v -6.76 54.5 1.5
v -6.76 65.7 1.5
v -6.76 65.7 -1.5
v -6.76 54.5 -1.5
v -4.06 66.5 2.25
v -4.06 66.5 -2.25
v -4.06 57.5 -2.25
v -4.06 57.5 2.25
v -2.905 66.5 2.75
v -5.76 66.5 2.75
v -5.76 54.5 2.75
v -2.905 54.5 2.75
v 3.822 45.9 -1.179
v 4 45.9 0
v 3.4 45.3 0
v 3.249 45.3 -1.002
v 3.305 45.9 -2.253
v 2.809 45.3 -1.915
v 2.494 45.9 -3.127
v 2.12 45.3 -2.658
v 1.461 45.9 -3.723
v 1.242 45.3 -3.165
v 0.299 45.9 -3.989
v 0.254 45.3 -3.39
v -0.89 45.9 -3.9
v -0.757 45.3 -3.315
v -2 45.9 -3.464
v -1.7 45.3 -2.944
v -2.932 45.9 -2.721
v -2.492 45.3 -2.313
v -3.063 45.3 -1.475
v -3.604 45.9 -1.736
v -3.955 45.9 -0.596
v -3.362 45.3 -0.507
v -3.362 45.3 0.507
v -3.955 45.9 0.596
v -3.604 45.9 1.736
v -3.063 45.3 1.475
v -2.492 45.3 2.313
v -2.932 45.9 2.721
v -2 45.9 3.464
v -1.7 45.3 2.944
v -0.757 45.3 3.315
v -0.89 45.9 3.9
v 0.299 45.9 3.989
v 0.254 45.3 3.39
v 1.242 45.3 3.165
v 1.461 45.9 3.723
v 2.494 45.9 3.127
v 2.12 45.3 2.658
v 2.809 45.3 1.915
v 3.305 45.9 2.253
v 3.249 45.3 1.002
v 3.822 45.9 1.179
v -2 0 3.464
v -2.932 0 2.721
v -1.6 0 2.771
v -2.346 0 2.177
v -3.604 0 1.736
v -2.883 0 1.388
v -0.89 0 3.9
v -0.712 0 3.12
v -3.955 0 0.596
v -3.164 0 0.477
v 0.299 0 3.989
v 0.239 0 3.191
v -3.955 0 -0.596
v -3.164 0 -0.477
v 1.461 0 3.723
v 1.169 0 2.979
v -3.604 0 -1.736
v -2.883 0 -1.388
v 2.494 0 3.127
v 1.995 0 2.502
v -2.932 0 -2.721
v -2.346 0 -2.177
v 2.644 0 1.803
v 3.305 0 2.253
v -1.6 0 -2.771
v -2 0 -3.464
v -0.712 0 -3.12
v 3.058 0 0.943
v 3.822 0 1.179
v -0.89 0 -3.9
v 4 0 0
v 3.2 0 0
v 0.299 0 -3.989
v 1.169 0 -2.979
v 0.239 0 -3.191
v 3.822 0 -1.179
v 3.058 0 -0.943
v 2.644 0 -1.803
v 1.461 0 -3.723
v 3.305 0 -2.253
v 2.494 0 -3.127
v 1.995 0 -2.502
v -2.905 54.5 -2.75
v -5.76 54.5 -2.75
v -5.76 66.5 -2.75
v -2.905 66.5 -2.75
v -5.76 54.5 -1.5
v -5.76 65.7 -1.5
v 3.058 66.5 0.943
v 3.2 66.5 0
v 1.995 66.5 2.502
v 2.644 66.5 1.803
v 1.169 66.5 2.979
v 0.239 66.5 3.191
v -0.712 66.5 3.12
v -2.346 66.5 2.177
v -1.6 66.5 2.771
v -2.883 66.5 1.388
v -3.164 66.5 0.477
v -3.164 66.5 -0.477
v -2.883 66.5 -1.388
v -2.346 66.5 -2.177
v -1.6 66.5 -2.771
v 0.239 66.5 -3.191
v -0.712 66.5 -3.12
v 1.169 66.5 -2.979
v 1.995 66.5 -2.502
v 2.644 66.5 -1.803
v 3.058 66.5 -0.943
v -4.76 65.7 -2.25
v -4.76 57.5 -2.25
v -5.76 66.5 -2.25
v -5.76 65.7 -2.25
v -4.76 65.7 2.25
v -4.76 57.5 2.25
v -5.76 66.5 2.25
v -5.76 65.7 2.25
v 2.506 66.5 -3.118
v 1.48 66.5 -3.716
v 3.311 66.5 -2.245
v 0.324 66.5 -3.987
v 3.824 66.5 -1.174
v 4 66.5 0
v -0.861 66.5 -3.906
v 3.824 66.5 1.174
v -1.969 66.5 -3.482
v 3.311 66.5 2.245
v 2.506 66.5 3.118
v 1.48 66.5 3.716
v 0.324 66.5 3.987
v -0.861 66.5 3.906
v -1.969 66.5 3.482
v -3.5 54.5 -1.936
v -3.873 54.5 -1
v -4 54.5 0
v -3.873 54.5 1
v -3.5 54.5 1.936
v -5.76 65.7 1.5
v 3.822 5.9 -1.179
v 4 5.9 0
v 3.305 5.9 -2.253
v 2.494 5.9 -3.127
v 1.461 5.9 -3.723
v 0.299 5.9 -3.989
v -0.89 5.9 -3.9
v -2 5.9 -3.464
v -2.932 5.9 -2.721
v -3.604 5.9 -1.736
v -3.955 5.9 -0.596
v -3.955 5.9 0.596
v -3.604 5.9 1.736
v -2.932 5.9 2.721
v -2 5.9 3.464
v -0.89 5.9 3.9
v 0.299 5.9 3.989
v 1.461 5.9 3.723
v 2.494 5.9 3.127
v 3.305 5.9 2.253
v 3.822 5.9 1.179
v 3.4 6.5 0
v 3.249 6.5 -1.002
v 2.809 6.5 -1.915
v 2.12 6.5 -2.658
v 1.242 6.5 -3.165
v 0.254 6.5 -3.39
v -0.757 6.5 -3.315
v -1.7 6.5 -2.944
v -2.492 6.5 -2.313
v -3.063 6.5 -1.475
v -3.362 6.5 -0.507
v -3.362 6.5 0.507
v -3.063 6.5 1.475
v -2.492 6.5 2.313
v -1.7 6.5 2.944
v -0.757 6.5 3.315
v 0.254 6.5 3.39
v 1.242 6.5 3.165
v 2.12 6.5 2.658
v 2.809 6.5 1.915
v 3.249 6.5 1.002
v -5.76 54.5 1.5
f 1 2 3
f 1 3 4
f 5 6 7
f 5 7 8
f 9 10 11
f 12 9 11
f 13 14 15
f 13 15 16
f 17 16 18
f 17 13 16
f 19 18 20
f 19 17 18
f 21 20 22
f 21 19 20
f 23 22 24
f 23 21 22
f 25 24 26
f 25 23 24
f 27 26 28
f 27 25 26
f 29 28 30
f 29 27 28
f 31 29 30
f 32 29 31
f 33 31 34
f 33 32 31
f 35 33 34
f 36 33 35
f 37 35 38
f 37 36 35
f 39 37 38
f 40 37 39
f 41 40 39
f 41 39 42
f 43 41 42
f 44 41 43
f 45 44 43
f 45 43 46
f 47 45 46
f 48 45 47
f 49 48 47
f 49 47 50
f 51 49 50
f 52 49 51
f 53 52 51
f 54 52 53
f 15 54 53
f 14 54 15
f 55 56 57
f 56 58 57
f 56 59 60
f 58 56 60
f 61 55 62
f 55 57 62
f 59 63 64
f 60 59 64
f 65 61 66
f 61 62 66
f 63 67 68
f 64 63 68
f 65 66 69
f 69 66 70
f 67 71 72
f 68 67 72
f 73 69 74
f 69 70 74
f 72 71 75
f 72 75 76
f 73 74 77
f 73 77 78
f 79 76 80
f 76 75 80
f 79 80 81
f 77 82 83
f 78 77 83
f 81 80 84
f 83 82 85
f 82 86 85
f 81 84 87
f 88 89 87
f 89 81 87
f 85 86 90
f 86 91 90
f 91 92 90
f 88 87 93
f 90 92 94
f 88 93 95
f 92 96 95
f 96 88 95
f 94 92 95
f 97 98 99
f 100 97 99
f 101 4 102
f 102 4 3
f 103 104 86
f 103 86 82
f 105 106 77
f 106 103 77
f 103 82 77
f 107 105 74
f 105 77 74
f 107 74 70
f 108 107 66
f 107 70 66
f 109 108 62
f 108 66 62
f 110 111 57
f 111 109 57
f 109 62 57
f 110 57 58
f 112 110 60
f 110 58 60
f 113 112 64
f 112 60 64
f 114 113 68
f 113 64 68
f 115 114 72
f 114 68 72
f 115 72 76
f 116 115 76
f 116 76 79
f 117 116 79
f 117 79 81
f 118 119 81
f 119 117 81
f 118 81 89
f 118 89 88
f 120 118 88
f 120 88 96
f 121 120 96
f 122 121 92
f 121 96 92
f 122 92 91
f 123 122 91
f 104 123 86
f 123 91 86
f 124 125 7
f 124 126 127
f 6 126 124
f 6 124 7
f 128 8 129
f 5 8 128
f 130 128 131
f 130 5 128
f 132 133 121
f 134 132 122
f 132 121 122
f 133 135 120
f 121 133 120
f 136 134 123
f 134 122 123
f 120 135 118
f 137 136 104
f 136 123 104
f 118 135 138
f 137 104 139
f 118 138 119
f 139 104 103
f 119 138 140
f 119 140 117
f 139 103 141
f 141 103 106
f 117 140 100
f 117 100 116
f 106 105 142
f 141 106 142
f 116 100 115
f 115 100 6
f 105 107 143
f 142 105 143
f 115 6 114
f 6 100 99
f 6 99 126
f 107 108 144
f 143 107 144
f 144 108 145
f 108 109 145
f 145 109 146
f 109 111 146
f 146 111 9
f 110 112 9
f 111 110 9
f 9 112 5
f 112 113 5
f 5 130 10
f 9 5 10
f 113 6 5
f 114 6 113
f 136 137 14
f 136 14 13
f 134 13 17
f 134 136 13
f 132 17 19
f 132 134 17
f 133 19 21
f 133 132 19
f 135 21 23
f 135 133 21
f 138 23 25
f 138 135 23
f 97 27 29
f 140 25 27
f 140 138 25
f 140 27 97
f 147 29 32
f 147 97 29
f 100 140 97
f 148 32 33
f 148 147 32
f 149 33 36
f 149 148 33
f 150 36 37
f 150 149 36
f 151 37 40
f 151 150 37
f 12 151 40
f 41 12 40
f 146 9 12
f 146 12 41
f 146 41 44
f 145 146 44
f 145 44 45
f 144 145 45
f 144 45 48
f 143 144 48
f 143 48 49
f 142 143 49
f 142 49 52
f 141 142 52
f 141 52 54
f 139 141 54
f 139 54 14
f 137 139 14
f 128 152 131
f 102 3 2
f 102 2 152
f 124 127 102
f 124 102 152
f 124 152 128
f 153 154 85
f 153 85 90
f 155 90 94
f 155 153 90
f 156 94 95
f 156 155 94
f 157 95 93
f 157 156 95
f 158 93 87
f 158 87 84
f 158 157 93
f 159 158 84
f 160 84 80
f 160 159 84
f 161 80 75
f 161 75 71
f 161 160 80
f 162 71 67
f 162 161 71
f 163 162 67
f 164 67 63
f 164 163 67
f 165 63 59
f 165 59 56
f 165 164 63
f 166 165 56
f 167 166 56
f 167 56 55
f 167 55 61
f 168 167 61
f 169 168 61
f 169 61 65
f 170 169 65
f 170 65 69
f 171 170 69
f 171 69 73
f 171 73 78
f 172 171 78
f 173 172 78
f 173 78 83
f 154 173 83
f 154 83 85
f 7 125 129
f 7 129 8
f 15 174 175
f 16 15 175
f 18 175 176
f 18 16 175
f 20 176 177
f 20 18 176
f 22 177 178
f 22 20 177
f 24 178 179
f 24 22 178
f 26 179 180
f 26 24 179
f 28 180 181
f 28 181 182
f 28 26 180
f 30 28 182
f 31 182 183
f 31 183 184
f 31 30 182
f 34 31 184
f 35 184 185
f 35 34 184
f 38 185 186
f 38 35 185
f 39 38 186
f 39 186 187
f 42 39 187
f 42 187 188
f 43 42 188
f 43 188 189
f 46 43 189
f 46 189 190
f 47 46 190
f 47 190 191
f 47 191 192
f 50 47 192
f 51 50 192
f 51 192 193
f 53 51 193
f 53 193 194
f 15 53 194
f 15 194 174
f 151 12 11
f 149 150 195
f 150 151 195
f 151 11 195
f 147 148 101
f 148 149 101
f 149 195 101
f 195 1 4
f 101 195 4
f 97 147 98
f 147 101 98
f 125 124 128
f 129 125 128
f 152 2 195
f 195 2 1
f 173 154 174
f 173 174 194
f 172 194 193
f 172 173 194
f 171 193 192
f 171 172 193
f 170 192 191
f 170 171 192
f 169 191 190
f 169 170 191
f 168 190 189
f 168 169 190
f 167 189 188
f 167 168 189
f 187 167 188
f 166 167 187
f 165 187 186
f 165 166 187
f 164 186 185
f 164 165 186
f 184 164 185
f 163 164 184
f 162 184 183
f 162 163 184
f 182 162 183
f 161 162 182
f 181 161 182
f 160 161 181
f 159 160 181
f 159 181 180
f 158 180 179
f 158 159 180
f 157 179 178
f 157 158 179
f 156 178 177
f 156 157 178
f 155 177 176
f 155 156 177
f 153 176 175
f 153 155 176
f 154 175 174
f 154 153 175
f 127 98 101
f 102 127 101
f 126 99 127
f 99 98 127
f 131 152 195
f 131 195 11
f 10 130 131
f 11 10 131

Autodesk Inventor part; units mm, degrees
ref_plane "XZ Plane" through (0, 0, 0) normal (0, 1, 0) x (-1, 0, 0)
ref_plane "XY Plane" through (0, 0, 0) normal (0, 0, 1) x (1, 0, 0)
sketch "Sketch1" plane through (0, 0, 0) normal (0, 0, 1) x (1, 0, 0)
  line L0 (0, 0) -> (0, 66.5)
  line L1 (3.2, 0) -> (4, 0)
  line L2 (4, 0) -> (4, 5.9)
  line L3 (4, 5.9) -> (3.4, 6.5)
  line L4 (3.4, 6.5) -> (3.4, 45.3)
  line L5 (3.4, 45.3) -> (4, 45.9)
  line L6 (4, 45.9) -> (4, 66.5)
  line L7 (4, 66.5) -> (3.2, 66.5)
  line L8 (3.2, 66.5) -> (3.2, 0)
  dimension "d0" = 45
  dimension "d1" = 45
  dimension "d2" = 6.4
  dimension "d3" = 8
  dimension "d4" = 6.5
  dimension "d5" = 45.3
  dimension "d6" = 66.5
  dimension "d7" = 6.8
revolve "Revolution1" add sketch "Sketch1" angle 360 about axis through (0, 0, 0) along (0, 1, 0)
ref_plane "Work Plane1" through (-6.76, 0, 0) normal (-1, 0, 0) x (0, -1, 0)
sketch "Sketch2" plane through (-6.76, 0, 0) normal (-1, 0, 0) x (0, -1, 0)
  line L0 (-65.7, 1.5) -> (-54.5, 1.5)
  line L1 (-54.5, 1.5) -> (-54.5, -1.5)
  line L2 (-54.5, -1.5) -> (-65.7, -1.5)
  line L3 (-65.7, -1.5) -> (-65.7, 1.5)
  line L4 (-65.7, 2.75) -> (-54.5, 2.75)
  line L5 (-54.5, 2.75) -> (-54.5, -2.75)
  line L6 (-54.5, -2.75) -> (-65.7, -2.75)
  line L7 (-65.7, -2.75) -> (-65.7, 2.75)
  line L8 (13.7787, 0) -> (-82.6723, 0) projected
  line L9 (0, -4) -> (0, 4) projected
  dimension "d10" = 54.5
  dimension "d11" = 65.7
  dimension "d12" = 5.5
  dimension "d13" = 3
extrude "Extrusion1" add sketch "Sketch2" against normal up to surface
extrude "Extrusion2" cut sketch "Sketch2" against normal blind 1 contours L7 L4 L5 L0 | L2 L5 L6 L7
sketch "Sketch3" plane through (-5.76, 0, 0) normal (-1, 0, 0) x (0, 0, 1)
  line L0 (-1.5, 65.7) -> (-1.5, 54.5) projected
  line L1 (-2.75, 65.7) -> (-1.5, 65.7) projected
  line L2 (-2.75, 54.5) -> (-2.75, 65.7) projected
  line L3 (-1.5, 54.5) -> (-2.75, 54.5) projected
  line L4 (1.5, 54.5) -> (1.5, 65.7) projected
  line L5 (2.75, 54.5) -> (1.5, 54.5) projected
  line L6 (2.75, 65.7) -> (2.75, 54.5) projected
  line L7 (1.5, 65.7) -> (2.75, 65.7) projected
  line L8 (-4, 66.5) -> (4, 66.5) projected
  line L9 (2.75, 65.7) -> (-2.75, 65.7)
  line L10 (-2.75, 65.7) -> (-2.75, 66.5)
  line L11 (-2.75, 66.5) -> (2.75, 66.5)
  line L12 (2.75, 66.5) -> (2.75, 65.7)
extrude "Extrusion3" add sketch "Sketch3" against normal up to surface contours L1 L10 L8 L12 L7 L9
sketch "Sketch4" plane through (0, 66.5, 0) normal (0, 1, 0) x (1, 0, 0)
  line L0 (-5.76, 1.5) -> (-5.76, 2.75) projected
  line L1 (-5.76, 2.25) -> (-4.06, 2.25)
  line L2 (-4.06, 2.25) -> (-4.06, -2.25)
  line L3 (-4.06, -2.25) -> (-5.76, -2.25)
  line L4 (-5.76, -2.75) -> (-5.76, 2.75) projected
  line L5 (-4.76, 2.25) -> (-4.76, -2.25)
  line L6 (-8.912, 0) -> (6.152, 0) projected
  line L7 (-5.76, 2.25) -> (-5.76, -2.25)
  point P0 (0, 0)
  dimension "d20" = 4.06
  dimension "d21" = 4.76
  dimension "d22" = 4.5
extrude "Extrusion4" cut sketch "Sketch4" against normal up to surface (0.8 mm away) contours L0 L1 L5 L6 L4 | L6 L5 L3 L4
extrude "Extrusion5" cut sketch "Sketch4" against normal blind 9 contours L1 L2 L6 L5 | L6 L2 L3 L5
equation "\"d1\" = d0"
properties part number "PP-12" material "ABS Plastic"
